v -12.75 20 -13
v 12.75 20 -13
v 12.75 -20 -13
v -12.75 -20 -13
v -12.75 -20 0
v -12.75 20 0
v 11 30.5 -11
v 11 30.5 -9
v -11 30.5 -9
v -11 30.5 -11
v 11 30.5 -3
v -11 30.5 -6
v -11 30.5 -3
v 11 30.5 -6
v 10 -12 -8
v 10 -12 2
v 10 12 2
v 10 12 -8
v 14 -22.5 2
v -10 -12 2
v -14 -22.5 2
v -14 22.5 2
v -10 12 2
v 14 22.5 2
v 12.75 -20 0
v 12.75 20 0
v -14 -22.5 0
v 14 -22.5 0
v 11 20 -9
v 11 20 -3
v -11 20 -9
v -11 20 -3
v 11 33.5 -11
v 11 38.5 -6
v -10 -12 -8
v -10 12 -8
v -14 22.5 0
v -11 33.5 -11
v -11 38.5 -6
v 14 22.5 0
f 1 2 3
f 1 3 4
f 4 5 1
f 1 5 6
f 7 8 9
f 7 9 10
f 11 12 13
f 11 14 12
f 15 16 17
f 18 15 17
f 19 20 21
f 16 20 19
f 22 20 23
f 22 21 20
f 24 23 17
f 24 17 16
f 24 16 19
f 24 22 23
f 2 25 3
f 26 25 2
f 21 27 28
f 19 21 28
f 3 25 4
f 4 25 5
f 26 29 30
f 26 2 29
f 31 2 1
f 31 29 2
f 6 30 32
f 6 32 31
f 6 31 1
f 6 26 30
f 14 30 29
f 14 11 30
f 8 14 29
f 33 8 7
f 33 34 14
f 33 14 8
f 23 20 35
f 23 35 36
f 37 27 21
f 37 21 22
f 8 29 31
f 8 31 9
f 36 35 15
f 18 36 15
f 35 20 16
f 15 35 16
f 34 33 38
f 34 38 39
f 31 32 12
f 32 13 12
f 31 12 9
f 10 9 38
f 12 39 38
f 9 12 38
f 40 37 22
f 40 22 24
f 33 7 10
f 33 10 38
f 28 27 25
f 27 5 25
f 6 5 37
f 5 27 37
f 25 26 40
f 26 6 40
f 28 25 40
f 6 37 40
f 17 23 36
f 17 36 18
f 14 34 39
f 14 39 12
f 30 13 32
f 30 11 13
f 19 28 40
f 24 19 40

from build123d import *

# Parameters (mm, degrees)
SKETCH_1_W          = 28
SKETCH_1_H          = 45
EXTRUDE_1_DEPTH     = 2
SKETCH_2_W          = 25.5
SKETCH_2_H          = 40
EXTRUDE_2_DEPTH     = 13
EXTRUDE_3_DEPTH     = 11
SKETCH_4_W          = 20
SKETCH_4_H          = 24
CUT_EXTRUDE_1_DEPTH = 10


with BuildPart() as part:
    # 草图1 → 凸台-拉伸1 (new body)
    with BuildSketch(Plane.XY):
        Rectangle(SKETCH_1_W, SKETCH_1_H)
    extrude(amount=EXTRUDE_1_DEPTH)

    # 草图2 → 凸台-拉伸2 (add)
    with BuildSketch(Plane(origin=(0, 0, 0), x_dir=(-1, 0, 0), z_dir=(0, 0, -1))):
        Rectangle(SKETCH_2_W, SKETCH_2_H)
    extrude(amount=EXTRUDE_2_DEPTH)

    # 草图3 → 凸台-拉伸3 (add, symmetric)
    with BuildSketch(Plane(origin=(0, 0, 0), x_dir=(0, 0, -1), z_dir=(1, 0, 0))):
        Polygon((3, 20), (9, 20), (9, 30.5), (11, 30.5), (11, 33.5), (6, 38.5), (6, 30.5), (3, 30.5), align=None)
    extrude(amount=EXTRUDE_3_DEPTH, both=True)

    # 草图4 → 切除-拉伸1 (cut)
    with BuildSketch(Plane.XY.offset(2)):
        Rectangle(SKETCH_4_W, SKETCH_4_H)
    extrude(amount=-CUT_EXTRUDE_1_DEPTH, mode=Mode.SUBTRACT)


solid = part.part
